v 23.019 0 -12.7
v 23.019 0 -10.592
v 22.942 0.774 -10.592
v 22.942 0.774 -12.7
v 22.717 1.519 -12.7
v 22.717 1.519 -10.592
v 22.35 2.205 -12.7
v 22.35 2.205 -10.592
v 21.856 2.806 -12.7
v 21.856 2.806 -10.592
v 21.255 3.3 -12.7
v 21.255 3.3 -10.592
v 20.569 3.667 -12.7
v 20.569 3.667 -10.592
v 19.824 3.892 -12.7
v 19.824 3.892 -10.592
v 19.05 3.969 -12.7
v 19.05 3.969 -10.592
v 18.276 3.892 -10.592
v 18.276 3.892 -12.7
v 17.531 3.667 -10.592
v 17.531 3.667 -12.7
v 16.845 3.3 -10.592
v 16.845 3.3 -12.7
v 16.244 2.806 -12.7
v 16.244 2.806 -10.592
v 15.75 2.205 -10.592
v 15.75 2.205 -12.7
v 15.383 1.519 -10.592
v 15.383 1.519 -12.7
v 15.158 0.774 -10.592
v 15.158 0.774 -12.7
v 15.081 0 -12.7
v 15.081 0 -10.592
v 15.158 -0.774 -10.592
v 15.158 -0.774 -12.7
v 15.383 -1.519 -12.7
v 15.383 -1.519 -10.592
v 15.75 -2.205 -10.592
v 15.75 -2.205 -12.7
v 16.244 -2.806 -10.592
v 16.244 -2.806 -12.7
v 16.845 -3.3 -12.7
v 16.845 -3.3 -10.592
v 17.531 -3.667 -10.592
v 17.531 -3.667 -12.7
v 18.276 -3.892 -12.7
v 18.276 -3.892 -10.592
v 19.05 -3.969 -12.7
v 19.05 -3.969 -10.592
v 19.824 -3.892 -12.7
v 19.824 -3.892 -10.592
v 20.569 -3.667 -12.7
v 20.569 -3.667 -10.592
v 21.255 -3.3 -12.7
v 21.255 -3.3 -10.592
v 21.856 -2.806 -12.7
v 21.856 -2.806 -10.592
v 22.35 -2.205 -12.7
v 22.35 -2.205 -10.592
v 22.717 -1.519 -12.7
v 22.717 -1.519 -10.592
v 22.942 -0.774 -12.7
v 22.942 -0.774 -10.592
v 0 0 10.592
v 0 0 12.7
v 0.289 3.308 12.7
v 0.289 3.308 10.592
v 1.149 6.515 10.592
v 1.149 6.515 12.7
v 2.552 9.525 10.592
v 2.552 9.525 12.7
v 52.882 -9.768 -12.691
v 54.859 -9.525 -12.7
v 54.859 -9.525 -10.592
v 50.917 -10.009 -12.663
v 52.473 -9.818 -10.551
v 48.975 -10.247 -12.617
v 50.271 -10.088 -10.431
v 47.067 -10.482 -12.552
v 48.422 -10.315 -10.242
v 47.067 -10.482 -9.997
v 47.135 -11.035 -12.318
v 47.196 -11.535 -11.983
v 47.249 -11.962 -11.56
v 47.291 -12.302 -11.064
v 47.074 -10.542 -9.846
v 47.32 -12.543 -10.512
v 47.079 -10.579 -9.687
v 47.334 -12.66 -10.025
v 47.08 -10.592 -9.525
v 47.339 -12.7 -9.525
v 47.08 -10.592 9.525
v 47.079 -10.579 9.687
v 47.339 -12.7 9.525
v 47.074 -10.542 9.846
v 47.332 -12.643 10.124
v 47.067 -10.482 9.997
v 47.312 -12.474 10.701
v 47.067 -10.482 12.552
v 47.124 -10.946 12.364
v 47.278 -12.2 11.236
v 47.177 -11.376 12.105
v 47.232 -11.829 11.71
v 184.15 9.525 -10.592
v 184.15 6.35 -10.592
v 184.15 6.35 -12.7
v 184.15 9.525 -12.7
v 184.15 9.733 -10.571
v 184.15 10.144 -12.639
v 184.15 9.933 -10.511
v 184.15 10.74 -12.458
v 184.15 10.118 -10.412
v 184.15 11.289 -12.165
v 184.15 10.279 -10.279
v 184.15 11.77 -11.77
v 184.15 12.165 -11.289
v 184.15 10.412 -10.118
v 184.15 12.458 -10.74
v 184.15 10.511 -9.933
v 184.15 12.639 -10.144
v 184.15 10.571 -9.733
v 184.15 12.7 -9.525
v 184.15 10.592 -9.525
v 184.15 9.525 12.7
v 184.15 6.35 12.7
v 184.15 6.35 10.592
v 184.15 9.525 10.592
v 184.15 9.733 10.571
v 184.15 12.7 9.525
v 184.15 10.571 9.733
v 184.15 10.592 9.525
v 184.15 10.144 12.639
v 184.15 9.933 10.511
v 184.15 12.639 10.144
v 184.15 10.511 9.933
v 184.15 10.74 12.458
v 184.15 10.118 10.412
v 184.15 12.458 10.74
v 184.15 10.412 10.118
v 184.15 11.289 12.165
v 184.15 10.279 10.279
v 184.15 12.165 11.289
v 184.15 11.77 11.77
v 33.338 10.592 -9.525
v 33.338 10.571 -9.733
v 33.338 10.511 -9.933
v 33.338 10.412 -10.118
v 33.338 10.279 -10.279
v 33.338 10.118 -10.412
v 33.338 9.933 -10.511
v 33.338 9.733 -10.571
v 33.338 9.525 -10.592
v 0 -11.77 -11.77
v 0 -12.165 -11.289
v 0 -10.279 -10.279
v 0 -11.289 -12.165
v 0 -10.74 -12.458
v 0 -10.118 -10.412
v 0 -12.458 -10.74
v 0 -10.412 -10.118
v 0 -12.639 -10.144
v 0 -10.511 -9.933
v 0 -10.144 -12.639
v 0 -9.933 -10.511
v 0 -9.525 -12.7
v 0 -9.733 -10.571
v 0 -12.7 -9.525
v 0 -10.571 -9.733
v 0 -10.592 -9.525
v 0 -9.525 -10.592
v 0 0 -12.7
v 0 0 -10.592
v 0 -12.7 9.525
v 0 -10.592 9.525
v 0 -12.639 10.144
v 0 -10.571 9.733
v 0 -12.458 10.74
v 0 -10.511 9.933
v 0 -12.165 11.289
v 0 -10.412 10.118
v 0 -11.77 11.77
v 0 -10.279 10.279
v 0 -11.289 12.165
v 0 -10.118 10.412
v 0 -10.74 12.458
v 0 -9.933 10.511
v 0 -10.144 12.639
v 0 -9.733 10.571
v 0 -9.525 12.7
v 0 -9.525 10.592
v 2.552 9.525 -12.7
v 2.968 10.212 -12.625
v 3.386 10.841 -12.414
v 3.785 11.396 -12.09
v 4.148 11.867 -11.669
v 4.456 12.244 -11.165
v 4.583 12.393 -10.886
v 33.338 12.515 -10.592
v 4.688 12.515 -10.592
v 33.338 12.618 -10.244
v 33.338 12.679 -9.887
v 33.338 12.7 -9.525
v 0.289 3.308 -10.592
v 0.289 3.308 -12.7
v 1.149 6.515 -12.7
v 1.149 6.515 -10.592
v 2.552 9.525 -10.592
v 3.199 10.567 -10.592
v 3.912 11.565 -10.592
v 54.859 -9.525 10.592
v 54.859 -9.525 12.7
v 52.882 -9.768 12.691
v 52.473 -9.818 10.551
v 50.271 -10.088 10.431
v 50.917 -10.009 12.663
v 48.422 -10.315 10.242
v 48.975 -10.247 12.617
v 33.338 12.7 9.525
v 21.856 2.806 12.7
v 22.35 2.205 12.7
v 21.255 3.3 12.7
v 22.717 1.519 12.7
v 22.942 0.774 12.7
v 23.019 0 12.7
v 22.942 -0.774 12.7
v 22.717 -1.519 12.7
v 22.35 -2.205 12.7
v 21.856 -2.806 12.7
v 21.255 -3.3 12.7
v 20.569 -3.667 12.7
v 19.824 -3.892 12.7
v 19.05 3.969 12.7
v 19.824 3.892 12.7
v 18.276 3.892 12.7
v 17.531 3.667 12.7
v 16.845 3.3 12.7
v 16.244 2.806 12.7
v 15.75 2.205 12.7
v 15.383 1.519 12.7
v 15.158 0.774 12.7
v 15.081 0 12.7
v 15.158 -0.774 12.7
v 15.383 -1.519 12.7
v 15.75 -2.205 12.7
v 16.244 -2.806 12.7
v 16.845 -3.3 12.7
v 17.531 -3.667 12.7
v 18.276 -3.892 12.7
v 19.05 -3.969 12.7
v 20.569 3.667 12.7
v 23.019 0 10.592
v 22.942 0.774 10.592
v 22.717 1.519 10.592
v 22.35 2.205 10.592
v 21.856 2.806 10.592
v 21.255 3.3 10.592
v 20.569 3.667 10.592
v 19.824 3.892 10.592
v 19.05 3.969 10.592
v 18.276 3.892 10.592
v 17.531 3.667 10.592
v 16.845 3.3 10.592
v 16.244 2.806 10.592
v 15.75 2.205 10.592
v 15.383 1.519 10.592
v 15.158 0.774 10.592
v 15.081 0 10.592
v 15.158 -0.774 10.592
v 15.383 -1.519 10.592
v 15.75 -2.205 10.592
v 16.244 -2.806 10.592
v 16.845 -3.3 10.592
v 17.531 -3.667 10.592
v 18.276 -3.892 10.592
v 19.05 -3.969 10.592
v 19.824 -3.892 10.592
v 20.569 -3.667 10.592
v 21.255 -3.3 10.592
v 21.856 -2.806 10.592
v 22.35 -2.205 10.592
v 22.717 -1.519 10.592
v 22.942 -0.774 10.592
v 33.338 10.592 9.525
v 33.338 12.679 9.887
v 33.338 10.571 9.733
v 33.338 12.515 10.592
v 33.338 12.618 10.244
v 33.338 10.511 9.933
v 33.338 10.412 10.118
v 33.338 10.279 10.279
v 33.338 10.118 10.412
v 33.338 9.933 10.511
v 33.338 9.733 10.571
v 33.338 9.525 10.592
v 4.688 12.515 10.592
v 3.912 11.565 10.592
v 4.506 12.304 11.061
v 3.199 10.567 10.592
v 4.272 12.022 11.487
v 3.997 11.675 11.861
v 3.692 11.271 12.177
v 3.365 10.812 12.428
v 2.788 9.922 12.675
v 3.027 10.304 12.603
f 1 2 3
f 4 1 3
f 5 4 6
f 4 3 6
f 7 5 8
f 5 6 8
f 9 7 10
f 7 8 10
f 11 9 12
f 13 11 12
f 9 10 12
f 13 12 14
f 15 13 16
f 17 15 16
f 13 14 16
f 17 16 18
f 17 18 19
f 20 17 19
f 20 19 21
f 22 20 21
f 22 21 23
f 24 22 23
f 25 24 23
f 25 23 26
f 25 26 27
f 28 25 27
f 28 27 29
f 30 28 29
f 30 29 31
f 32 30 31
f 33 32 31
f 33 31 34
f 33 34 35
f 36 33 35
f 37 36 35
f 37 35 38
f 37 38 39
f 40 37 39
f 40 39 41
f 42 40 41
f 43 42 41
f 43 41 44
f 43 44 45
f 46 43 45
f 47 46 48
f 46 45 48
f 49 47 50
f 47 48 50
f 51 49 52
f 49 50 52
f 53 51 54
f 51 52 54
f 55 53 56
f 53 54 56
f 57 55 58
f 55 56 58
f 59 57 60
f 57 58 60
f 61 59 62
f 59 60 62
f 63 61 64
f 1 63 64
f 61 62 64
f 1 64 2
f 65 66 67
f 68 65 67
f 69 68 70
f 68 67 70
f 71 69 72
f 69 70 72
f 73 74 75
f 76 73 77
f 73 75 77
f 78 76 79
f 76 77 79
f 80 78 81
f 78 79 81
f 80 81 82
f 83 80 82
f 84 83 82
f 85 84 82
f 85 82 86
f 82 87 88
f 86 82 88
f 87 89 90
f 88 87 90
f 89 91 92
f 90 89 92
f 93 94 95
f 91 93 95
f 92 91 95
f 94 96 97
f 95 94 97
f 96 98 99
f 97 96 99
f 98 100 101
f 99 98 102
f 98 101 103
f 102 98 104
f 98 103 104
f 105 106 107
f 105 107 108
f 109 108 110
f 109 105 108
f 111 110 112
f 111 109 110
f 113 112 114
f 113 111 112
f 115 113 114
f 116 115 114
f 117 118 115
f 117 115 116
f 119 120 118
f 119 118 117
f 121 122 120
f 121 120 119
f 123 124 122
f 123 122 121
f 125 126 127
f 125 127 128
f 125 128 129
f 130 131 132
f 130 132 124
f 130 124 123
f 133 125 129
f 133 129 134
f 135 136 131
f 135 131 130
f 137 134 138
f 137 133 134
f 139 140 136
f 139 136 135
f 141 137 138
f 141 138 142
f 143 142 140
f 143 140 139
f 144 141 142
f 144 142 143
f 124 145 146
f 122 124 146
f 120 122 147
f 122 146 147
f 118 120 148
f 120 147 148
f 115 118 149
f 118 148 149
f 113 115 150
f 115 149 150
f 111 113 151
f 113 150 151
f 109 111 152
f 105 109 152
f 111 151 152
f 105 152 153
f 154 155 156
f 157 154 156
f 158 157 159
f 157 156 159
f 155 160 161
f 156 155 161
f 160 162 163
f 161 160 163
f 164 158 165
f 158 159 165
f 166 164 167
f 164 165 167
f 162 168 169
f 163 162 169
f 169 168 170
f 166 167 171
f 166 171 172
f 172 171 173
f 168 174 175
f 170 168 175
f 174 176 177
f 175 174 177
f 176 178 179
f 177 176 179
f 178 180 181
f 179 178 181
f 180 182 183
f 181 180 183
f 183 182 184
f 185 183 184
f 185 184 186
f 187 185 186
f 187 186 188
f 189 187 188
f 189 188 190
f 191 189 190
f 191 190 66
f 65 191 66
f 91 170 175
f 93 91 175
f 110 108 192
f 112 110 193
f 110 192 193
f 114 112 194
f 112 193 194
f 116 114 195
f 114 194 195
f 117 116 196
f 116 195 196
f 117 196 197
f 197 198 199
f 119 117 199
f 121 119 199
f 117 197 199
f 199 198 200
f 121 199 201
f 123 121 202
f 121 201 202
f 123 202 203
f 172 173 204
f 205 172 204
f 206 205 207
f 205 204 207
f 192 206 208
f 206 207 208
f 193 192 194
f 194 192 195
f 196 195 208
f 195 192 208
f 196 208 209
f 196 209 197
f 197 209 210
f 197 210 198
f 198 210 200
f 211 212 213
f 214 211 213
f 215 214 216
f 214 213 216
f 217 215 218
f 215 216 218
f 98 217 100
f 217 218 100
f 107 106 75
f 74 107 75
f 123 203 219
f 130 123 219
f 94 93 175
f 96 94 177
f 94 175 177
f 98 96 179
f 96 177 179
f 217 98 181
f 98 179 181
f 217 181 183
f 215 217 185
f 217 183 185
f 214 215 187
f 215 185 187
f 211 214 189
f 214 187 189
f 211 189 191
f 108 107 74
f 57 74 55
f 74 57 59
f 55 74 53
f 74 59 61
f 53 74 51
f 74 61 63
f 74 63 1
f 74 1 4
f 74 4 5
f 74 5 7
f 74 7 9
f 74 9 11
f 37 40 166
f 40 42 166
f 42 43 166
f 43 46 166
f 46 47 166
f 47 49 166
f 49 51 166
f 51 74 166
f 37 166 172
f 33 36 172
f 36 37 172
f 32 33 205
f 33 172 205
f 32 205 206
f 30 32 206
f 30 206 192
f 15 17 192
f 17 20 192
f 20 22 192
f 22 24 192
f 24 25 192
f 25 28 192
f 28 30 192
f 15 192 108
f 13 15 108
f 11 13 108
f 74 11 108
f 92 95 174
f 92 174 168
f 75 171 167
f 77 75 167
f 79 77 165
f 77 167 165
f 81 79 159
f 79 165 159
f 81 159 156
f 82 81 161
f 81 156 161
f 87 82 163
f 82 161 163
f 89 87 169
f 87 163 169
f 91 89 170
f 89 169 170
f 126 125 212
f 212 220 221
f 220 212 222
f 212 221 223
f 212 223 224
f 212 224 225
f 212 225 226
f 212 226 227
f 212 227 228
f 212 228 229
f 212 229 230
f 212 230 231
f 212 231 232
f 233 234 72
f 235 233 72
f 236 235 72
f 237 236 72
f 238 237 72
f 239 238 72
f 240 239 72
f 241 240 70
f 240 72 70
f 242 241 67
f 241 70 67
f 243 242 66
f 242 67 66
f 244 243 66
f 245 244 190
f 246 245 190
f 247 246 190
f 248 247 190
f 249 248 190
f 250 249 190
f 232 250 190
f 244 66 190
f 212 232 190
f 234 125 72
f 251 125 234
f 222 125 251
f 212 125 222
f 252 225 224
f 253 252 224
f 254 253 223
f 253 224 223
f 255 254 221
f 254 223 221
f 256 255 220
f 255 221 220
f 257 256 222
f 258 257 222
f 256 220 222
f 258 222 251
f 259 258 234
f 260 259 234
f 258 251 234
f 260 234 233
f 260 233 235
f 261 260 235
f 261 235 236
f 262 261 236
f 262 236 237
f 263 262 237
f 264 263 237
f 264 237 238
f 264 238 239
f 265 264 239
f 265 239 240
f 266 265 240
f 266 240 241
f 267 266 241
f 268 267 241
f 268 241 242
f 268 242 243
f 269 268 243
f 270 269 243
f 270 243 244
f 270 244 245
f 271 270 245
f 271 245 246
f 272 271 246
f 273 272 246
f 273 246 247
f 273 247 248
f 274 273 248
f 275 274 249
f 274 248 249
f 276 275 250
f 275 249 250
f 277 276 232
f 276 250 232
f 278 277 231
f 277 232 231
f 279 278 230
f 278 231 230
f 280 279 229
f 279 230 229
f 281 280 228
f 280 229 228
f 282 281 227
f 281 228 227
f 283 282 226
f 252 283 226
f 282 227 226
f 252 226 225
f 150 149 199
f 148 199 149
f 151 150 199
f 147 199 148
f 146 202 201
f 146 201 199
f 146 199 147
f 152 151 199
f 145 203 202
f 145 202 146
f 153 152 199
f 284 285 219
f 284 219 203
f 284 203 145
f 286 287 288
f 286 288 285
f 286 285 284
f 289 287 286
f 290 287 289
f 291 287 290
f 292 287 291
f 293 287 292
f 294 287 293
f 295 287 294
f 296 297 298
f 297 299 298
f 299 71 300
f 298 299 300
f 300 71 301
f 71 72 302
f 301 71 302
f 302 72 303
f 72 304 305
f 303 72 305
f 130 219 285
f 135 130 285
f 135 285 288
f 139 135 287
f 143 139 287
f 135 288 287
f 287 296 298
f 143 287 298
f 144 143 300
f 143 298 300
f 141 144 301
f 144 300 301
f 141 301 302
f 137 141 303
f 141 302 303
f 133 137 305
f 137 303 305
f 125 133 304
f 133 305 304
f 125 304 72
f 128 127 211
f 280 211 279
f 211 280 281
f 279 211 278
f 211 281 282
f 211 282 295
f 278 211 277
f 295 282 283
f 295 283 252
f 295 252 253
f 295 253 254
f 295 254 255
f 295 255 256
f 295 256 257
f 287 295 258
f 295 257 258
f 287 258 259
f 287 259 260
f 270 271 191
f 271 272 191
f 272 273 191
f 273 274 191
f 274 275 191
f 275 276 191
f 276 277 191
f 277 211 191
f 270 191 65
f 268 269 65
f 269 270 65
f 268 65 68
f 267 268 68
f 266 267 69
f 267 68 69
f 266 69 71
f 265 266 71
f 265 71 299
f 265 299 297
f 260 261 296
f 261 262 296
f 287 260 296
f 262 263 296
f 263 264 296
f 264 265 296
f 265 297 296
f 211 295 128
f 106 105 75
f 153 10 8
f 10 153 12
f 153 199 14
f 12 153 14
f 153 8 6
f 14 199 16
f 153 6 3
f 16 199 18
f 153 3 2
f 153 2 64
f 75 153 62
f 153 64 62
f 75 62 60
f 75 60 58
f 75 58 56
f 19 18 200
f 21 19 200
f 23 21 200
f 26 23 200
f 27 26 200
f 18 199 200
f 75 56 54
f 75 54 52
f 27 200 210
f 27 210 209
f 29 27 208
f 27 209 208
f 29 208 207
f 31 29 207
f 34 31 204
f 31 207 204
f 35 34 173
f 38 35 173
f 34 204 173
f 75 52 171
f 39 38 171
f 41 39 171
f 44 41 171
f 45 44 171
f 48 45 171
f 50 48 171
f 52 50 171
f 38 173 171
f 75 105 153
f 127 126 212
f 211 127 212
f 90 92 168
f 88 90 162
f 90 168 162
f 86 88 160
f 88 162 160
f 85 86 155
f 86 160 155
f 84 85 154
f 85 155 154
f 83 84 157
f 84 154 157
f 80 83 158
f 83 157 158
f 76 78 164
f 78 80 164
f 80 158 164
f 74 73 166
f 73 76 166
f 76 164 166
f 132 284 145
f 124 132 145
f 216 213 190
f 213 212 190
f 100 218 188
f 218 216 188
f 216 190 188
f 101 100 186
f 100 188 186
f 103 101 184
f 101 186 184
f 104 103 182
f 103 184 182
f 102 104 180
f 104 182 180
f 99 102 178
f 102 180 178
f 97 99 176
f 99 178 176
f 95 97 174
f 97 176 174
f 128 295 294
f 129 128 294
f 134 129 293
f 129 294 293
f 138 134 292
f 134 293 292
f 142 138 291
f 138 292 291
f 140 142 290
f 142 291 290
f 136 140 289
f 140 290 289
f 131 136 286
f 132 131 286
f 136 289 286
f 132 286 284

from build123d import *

# Parameters (mm, degrees)
F1_DEPTH = 184.15
F3_DEPTH = 33.3375
F4_R     = 3.96875
F5_DEPTH = 25.401
F7_DEPTH = 25.401
F9_DEPTH = 25.4010001


with BuildPart() as f1:
    # F0 (on Right) → F1 (new body)
    with BuildSketch(Plane.YZ):
        with BuildLine():
            Line((-9.525, -12.7), (9.525, -12.7))
            ThreePointArc((9.525, -12.7), (11.7700640303, -11.7700640303), (12.7, -9.525))
            Line((12.7, -9.525), (12.7, 9.525))
            ThreePointArc((12.7, 9.525), (11.7700640303, 11.7700640303), (9.525, 12.7))
            Line((9.525, 12.7), (-9.525, 12.7))
            ThreePointArc((-9.525, 12.7), (-11.7700640303, 11.7700640303), (-12.7, 9.525))
            Line((-12.7, 9.525), (-12.7, -9.525))
            ThreePointArc((-12.7, -9.525), (-11.7700640303, -11.7700640303), (-9.525, -12.7))
        make_face()
        with BuildLine():
            Line((-9.525, 10.5918), (9.525, 10.5918))
            ThreePointArc((9.525, 10.5918), (10.2793415142, 10.2793415142), (10.5918, 9.525))
            Line((10.5918, 9.525), (10.5918, -9.525))
            ThreePointArc((10.5918, -9.525), (10.2793415142, -10.2793415142), (9.525, -10.5918))
            Line((9.525, -10.5918), (-9.525, -10.5918))
            ThreePointArc((-9.525, -10.5918), (-10.2793415142, -10.2793415142), (-10.5918, -9.525))
            Line((-10.5918, -9.525), (-10.5918, 9.525))
            ThreePointArc((-10.5918, 9.525), (-10.2793415142, 10.2793415142), (-9.525, 10.5918))
        make_face(mode=Mode.SUBTRACT)
    extrude(amount=F1_DEPTH)

    # F2 (on face) → F3 (cut)
    with BuildSketch(Plane(origin=(0, 0, 0), x_dir=(0, -1, 0), z_dir=(-1, 0, 0))):
        with BuildLine():
            ThreePointArc((-12.7, 9.525), (-12.6535126242, 10.0663259281), (-12.5154118044, 10.5918))
            Line((-12.5154118044, 10.5918), (-16.0259325057, 10.5918))
            Line((-16.0259325057, 10.5918), (-16.0259325057, -10.5918))
            Line((-16.0259325057, -10.5918), (-12.5154118044, -10.5918))
            ThreePointArc((-12.5154118044, -10.5918), (-12.6535126242, -10.0663259281), (-12.7, -9.525))
            Line((-12.7, -9.525), (-12.7, 9.525))
        make_face()
        with BuildLine():
            Line((-7.5196851976, -10.5918), (-7.5196851976, 10.5918))
            Line((-7.5196851976, 10.5918), (-9.525, 10.5918))
            ThreePointArc((-9.525, 10.5918), (-10.2793415142, 10.2793415142), (-10.5918, 9.525))
            Line((-10.5918, 9.525), (-10.5918, -9.525))
            ThreePointArc((-10.5918, -9.525), (-10.2793415142, -10.2793415142), (-9.525, -10.5918))
            Line((-9.525, -10.5918), (-7.5196851976, -10.5918))
        make_face()
        with BuildLine():
            ThreePointArc((-10.5918, 9.525), (-10.2793415142, 10.2793415142), (-9.525, 10.5918))
            Line((-9.525, 10.5918), (-12.5154118044, 10.5918))
            ThreePointArc((-12.5154118044, 10.5918), (-12.6535126242, 10.0663259281), (-12.7, 9.525))
            Line((-12.7, 9.525), (-12.7, -9.525))
            ThreePointArc((-12.7, -9.525), (-12.6535126242, -10.0663259281), (-12.5154118044, -10.5918))
            Line((-12.5154118044, -10.5918), (-9.525, -10.5918))
            ThreePointArc((-9.525, -10.5918), (-10.2793415142, -10.2793415142), (-10.5918, -9.525))
            Line((-10.5918, -9.525), (-10.5918, 9.525))
        make_face()
    extrude(amount=-F3_DEPTH, mode=Mode.SUBTRACT)

    # F4 (on face) → F5 (cut, through all)
    with BuildSketch(Plane.XY.offset(12.7)):
        with Locations((19.05, 0)):
            Circle(F4_R)
    extrude(amount=-F5_DEPTH, mode=Mode.SUBTRACT)

    # F6 (on face) → F7 (cut, through all)
    with BuildSketch(Plane.XY.offset(12.7)):
        with BuildLine():
            ThreePointArc((2.5522160579, 9.525), (4.2134911079, 11.9490796254), (6.2278308065, 14.0888068044))
            Line((6.2278308065, 14.0888068044), (1.4018084571, 20.3806743289))
            ThreePointArc((1.4018084571, 20.3806743289), (-5.47164532, 11.203546833), (-7.9097950815, 0))
            Line((-7.9097950815, 0), (0, 0))
            Line((0, 0), (0, 9.525))
            Line((0, 9.525), (2.5522160579, 9.525))
        make_face()
        with BuildLine():
            ThreePointArc((0, 0), (0.6491130092, 4.9305028092), (2.5522160579, 9.525))
            Line((2.5522160579, 9.525), (0, 9.525))
            Line((0, 9.525), (0, 0))
        make_face()
    extrude(amount=-F7_DEPTH, mode=Mode.SUBTRACT)

    # F8 (on face) → F9 (cut, through all)
    with BuildSketch(Plane.XY.offset(12.7)):
        Polygon((184.15, -9.525), (184.15, 6.35), (54.8585004559, -9.525), align=None)
        Polygon((188.5616199521, -29.5797611986), (184.15, 6.35), (184.15, -9.525), (54.8585004559, -9.525), (47.0669696314, -10.481679691), (51.4785895836, -46.4114408897), align=None)
    extrude(amount=-F9_DEPTH, mode=Mode.SUBTRACT)


solid = f1.part
